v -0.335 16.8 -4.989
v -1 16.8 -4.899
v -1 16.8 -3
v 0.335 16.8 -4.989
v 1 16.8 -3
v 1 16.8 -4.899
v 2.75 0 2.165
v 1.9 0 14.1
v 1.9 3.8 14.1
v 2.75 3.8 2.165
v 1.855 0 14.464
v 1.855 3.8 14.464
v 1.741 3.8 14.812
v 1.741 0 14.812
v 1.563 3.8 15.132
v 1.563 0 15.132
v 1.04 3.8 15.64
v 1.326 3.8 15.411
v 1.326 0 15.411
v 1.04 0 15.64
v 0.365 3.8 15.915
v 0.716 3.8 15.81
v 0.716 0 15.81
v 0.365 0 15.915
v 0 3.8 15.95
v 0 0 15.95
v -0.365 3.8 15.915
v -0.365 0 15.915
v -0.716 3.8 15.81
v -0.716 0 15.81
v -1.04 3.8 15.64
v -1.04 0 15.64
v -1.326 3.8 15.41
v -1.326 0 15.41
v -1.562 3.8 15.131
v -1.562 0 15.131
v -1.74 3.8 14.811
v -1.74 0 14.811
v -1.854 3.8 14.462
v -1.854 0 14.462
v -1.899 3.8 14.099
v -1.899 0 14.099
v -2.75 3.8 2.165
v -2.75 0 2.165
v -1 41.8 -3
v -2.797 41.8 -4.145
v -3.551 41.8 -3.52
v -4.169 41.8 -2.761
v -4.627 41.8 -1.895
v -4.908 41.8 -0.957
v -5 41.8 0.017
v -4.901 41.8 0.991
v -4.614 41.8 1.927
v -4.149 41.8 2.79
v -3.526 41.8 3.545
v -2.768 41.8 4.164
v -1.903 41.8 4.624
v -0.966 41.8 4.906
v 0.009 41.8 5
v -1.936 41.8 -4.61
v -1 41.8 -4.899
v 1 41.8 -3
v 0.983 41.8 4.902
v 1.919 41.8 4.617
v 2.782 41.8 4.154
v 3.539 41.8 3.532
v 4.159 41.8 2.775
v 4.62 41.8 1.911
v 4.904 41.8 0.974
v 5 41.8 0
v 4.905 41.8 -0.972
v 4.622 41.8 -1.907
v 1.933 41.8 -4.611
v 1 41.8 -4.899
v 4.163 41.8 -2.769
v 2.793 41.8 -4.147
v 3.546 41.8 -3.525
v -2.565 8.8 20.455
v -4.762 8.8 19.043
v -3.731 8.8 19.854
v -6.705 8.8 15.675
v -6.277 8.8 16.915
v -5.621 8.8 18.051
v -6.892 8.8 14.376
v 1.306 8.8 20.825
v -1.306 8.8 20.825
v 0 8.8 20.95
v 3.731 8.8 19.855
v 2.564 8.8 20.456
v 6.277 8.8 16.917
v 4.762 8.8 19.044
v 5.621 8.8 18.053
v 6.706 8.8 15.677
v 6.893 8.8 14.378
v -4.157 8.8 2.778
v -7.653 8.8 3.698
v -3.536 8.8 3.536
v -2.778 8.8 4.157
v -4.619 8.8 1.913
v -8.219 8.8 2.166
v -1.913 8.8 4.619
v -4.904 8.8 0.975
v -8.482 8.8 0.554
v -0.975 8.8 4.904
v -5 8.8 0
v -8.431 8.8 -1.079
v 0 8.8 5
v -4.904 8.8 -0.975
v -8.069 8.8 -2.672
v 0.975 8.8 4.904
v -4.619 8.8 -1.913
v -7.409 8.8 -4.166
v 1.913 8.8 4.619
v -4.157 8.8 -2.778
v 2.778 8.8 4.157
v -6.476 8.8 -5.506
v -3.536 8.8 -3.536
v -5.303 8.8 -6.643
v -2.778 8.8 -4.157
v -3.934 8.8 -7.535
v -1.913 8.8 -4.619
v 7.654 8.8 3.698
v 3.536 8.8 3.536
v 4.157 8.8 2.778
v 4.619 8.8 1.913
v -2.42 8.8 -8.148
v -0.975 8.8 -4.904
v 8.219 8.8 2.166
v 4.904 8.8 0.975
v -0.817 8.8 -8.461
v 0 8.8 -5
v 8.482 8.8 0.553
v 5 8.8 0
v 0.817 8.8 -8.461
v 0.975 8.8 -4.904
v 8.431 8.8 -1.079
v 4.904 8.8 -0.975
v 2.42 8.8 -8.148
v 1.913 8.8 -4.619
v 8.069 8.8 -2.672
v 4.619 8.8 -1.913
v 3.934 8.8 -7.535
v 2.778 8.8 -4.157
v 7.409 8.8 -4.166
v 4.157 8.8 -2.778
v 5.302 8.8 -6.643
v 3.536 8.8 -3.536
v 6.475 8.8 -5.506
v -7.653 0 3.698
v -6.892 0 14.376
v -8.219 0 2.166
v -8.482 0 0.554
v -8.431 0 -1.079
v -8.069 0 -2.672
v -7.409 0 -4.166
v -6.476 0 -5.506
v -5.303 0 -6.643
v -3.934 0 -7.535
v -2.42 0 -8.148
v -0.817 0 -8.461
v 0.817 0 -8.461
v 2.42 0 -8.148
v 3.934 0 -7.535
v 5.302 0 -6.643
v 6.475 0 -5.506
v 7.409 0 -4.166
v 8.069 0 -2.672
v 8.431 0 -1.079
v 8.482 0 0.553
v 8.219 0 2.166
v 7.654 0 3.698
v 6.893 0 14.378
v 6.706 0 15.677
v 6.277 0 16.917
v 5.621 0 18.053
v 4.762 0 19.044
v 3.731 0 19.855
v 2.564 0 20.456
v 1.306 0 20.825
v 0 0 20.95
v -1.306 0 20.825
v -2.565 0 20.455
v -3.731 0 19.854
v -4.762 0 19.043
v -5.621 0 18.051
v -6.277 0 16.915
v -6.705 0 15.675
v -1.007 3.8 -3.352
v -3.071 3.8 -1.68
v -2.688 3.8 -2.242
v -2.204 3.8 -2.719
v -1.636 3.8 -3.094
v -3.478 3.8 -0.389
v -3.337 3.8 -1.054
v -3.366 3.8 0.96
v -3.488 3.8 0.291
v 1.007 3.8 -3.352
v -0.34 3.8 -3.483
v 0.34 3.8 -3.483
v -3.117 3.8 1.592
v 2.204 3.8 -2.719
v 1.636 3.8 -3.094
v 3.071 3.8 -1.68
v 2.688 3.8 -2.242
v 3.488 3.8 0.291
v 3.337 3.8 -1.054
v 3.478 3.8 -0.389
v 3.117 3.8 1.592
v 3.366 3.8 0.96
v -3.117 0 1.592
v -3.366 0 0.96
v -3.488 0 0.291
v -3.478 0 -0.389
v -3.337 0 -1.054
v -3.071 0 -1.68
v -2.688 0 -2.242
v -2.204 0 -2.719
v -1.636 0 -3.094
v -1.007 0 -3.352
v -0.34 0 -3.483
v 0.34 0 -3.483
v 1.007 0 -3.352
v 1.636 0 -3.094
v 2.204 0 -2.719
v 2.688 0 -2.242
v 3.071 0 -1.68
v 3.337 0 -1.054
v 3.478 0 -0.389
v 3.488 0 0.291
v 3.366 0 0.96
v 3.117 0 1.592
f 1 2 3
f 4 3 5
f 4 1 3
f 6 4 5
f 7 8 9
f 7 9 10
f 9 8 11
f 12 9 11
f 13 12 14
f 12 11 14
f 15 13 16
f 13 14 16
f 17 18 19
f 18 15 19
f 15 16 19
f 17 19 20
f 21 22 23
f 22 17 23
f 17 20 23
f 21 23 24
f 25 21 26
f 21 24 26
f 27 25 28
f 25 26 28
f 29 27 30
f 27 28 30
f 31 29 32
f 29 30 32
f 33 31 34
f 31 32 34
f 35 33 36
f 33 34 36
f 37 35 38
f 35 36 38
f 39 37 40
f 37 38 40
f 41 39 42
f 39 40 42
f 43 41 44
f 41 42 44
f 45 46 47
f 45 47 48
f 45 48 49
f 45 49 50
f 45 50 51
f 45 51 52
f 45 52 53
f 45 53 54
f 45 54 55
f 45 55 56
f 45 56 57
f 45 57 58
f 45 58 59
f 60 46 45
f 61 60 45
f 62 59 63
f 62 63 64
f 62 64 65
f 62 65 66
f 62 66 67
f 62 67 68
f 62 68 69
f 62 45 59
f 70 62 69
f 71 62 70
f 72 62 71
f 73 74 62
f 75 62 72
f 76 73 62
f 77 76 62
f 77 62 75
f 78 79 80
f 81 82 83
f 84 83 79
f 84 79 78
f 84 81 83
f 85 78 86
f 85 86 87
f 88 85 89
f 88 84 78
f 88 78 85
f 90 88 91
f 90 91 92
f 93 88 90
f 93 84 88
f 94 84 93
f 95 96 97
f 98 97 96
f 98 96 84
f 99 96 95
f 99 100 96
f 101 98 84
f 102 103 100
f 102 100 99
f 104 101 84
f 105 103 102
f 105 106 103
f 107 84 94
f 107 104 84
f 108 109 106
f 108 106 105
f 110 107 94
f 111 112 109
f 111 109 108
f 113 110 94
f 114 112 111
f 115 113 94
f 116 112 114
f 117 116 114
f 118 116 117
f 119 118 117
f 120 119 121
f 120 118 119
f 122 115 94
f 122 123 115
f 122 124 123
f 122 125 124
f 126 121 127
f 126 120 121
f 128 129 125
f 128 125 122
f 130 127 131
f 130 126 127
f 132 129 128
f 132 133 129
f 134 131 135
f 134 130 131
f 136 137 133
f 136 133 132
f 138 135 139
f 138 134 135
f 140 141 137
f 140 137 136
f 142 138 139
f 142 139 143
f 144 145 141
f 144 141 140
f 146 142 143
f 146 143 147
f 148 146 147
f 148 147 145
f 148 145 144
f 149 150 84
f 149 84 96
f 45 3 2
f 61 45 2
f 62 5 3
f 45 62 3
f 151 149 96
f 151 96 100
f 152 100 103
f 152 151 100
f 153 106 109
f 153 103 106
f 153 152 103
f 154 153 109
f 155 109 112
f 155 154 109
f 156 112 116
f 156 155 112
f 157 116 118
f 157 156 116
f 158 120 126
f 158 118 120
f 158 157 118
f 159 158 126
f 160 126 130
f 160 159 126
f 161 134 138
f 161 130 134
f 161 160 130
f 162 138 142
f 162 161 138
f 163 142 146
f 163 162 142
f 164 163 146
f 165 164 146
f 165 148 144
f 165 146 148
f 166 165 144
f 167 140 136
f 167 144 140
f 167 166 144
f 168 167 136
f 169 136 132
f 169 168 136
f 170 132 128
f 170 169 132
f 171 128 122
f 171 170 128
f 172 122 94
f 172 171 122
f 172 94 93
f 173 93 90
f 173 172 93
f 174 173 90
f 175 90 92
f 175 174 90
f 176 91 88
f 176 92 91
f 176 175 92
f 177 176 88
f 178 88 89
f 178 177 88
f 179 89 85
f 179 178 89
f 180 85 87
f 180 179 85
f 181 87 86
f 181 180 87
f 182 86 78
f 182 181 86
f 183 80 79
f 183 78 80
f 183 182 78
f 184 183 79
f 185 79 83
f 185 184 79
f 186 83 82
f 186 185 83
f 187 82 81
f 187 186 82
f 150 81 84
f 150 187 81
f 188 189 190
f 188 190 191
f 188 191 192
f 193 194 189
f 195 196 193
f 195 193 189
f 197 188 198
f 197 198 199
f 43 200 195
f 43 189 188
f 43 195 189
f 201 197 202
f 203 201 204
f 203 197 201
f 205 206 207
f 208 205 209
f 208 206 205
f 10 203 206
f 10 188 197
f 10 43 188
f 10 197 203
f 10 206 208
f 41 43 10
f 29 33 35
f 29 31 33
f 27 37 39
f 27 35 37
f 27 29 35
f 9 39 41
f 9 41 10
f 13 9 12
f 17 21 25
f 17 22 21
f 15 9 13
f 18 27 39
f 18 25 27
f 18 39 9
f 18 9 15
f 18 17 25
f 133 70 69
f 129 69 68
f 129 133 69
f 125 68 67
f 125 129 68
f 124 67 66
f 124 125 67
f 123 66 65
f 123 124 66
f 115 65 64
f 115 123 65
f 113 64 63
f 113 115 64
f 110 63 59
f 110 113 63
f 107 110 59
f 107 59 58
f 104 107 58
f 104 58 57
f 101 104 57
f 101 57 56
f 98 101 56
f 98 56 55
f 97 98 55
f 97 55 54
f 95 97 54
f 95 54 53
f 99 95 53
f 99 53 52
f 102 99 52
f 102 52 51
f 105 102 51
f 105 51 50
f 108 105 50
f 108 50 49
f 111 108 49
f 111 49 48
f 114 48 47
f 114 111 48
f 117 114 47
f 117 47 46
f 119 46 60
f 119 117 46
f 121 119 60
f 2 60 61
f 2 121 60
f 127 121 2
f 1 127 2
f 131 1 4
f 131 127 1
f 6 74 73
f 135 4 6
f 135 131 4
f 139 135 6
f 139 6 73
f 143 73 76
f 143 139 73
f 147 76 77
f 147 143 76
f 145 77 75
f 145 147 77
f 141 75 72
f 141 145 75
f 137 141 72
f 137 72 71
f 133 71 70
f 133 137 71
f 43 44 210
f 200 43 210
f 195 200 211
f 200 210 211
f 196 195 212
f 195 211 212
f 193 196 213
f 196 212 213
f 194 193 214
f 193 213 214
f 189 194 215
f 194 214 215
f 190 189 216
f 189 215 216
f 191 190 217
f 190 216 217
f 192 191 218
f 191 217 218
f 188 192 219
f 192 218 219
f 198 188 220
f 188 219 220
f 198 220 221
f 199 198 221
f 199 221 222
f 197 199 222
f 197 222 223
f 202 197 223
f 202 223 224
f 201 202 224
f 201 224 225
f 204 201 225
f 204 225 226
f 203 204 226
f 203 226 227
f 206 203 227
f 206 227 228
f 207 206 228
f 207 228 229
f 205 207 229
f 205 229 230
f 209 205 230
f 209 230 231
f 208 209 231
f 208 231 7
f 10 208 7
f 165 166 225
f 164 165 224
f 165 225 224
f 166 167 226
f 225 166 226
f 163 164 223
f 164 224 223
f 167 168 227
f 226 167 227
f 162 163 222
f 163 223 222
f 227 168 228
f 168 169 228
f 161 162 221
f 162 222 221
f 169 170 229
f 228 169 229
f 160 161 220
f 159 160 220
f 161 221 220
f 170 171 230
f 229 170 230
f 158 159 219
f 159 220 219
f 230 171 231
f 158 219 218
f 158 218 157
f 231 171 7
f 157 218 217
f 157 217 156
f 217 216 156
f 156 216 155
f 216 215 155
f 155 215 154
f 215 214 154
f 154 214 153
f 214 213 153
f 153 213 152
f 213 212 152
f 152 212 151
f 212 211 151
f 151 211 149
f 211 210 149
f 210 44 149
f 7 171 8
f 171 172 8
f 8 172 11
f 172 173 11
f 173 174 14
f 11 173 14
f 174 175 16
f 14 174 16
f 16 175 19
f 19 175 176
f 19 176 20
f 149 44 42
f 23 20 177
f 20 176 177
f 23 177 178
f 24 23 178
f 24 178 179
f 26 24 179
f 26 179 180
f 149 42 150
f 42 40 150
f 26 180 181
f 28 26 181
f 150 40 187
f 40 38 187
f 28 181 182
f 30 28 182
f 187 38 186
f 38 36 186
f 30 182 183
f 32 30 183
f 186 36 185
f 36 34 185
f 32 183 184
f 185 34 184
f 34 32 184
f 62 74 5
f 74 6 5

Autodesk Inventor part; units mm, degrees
ref_plane "YZ Plane" through (0, 0, 0) normal (1, 0, 0) x (0, 1, 0)
ref_plane "XZ Plane" through (0, 0, 0) normal (0, 1, 0) x (-1, 0, 0)
ref_plane "XY Plane" through (0, 0, 0) normal (0, 0, 1) x (1, 0, 0)
sketch "Sketch1" plane through (0, 0, 0) normal (0, 1, 0) x (-1, 0, 0)
  arc A0 (-2.75, 2.1651) -> (2.75, 2.1651) centre (0, 0) ccw
  line L0 (-1.9, 14.1) -> (-2.75, 2.1651)
  line L1 (1.8987, 14.0987) -> (2.75, 2.1651)
  arc A1 (1.8987, 14.0987) -> (-1.9, 14.1) centre (-0.0007, 14.05) ccw
  circle A2 centre (0, 0) radius 0.5
  arc A3 (-7.6535, 3.6978) -> (7.6533, 3.6982) centre (0, 0) ccw
  line L2 (-7.6535, 3.6978) -> (-6.8928, 14.3783)
  arc A4 (6.8916, 14.3762) -> (-6.8928, 14.3783) centre (-0.0007, 14.05) ccw
  line L3 (6.8916, 14.3762) -> (7.6533, 3.6982)
  point P0 (0, 15.95)
  dimension "d0" = 1
  dimension "d9" = 1.9
  dimension "d10" = 15.95
  dimension "d11" = 3.5
  dimension "d17" = 5
extrude "Extrusion1" add sketch "Sketch1" along normal blind 3.8 contours L2 A4 L3 A3
sketch "Sketch2" plane through (0, 3.8, 0) normal (0, 1, 0) x (1, 0, 0)
  arc A0 (2.75, -2.1651) -> (-2.75, -2.1651) centre (0, 0) ccw projected
  circle A1 centre (0, 0) radius 3.5
  arc A2 (-6.8916, -14.3762) -> (6.8928, -14.3783) centre (0.0007, -14.05) ccw projected
  line L0 (-7.6533, -3.6982) -> (-6.8916, -14.3762) projected
  arc A3 (7.6535, -3.6978) -> (-7.6533, -3.6982) centre (0, 0) ccw projected
  line L1 (6.8928, -14.3783) -> (7.6535, -3.6978) projected
  arc A4 (2.75, -2.1651) -> (-2.75, -2.1651) centre (0, 0) ccw projected
  point P0 (2.75, -2.1651)
  point P1 (-2.75, -2.1651)
extrude "Extrusion2" add sketch "Sketch2" along normal blind 5
sketch "Sketch3" plane through (0, 8.8, 0) normal (0, 1, 0) x (1, 0, 0)
  arc A0 (2.75, -2.1651) -> (-2.75, -2.1651) centre (0, 0) ccw projected
  circle A1 centre (0, 0) radius 5
  dimension "d22" = 10
extrude "Extrusion3" add sketch "Sketch3" along normal blind 8
sketch "Sketch4" plane through (0, 16.8, 0) normal (0, 1, 0) x (1, 0, 0)
  circle A0 centre (0, 0) radius 5
  line L0 (1, 3) -> (-1, 3)
  line L1 (-1, 3) -> (-1, 7)
  line L2 (-1, 7) -> (1, 7)
  line L3 (1, 7) -> (1, 3)
  line L4 (1, 3) -> (-1, 7) construction
  line L5 (-1, 3) -> (1, 7) construction
  point P0 (0, 5)
  point P1 (-1, 4.899)
  point P2 (1, 4.899)
  dimension "d25" = 10
  dimension "d26" = 2
  dimension "d27" = 4
  dimension "d28" = 1
extrude "Extrusion4" add sketch "Sketch4" along normal blind 25 contours A0 L1 L0 L3 picked at (-0.1517, 0.3403)
sketch "Sketch5" plane through (0, 3.8, 0) normal (0, -1, 0) x (1, 0, 0)
  circle A0 centre (0, 0) radius 3.5
  dimension "d31" = 7
extrude "Extrusion5" add sketch "Sketch5" against normal blind 5
properties part number "Servo_Shaft_V2"
